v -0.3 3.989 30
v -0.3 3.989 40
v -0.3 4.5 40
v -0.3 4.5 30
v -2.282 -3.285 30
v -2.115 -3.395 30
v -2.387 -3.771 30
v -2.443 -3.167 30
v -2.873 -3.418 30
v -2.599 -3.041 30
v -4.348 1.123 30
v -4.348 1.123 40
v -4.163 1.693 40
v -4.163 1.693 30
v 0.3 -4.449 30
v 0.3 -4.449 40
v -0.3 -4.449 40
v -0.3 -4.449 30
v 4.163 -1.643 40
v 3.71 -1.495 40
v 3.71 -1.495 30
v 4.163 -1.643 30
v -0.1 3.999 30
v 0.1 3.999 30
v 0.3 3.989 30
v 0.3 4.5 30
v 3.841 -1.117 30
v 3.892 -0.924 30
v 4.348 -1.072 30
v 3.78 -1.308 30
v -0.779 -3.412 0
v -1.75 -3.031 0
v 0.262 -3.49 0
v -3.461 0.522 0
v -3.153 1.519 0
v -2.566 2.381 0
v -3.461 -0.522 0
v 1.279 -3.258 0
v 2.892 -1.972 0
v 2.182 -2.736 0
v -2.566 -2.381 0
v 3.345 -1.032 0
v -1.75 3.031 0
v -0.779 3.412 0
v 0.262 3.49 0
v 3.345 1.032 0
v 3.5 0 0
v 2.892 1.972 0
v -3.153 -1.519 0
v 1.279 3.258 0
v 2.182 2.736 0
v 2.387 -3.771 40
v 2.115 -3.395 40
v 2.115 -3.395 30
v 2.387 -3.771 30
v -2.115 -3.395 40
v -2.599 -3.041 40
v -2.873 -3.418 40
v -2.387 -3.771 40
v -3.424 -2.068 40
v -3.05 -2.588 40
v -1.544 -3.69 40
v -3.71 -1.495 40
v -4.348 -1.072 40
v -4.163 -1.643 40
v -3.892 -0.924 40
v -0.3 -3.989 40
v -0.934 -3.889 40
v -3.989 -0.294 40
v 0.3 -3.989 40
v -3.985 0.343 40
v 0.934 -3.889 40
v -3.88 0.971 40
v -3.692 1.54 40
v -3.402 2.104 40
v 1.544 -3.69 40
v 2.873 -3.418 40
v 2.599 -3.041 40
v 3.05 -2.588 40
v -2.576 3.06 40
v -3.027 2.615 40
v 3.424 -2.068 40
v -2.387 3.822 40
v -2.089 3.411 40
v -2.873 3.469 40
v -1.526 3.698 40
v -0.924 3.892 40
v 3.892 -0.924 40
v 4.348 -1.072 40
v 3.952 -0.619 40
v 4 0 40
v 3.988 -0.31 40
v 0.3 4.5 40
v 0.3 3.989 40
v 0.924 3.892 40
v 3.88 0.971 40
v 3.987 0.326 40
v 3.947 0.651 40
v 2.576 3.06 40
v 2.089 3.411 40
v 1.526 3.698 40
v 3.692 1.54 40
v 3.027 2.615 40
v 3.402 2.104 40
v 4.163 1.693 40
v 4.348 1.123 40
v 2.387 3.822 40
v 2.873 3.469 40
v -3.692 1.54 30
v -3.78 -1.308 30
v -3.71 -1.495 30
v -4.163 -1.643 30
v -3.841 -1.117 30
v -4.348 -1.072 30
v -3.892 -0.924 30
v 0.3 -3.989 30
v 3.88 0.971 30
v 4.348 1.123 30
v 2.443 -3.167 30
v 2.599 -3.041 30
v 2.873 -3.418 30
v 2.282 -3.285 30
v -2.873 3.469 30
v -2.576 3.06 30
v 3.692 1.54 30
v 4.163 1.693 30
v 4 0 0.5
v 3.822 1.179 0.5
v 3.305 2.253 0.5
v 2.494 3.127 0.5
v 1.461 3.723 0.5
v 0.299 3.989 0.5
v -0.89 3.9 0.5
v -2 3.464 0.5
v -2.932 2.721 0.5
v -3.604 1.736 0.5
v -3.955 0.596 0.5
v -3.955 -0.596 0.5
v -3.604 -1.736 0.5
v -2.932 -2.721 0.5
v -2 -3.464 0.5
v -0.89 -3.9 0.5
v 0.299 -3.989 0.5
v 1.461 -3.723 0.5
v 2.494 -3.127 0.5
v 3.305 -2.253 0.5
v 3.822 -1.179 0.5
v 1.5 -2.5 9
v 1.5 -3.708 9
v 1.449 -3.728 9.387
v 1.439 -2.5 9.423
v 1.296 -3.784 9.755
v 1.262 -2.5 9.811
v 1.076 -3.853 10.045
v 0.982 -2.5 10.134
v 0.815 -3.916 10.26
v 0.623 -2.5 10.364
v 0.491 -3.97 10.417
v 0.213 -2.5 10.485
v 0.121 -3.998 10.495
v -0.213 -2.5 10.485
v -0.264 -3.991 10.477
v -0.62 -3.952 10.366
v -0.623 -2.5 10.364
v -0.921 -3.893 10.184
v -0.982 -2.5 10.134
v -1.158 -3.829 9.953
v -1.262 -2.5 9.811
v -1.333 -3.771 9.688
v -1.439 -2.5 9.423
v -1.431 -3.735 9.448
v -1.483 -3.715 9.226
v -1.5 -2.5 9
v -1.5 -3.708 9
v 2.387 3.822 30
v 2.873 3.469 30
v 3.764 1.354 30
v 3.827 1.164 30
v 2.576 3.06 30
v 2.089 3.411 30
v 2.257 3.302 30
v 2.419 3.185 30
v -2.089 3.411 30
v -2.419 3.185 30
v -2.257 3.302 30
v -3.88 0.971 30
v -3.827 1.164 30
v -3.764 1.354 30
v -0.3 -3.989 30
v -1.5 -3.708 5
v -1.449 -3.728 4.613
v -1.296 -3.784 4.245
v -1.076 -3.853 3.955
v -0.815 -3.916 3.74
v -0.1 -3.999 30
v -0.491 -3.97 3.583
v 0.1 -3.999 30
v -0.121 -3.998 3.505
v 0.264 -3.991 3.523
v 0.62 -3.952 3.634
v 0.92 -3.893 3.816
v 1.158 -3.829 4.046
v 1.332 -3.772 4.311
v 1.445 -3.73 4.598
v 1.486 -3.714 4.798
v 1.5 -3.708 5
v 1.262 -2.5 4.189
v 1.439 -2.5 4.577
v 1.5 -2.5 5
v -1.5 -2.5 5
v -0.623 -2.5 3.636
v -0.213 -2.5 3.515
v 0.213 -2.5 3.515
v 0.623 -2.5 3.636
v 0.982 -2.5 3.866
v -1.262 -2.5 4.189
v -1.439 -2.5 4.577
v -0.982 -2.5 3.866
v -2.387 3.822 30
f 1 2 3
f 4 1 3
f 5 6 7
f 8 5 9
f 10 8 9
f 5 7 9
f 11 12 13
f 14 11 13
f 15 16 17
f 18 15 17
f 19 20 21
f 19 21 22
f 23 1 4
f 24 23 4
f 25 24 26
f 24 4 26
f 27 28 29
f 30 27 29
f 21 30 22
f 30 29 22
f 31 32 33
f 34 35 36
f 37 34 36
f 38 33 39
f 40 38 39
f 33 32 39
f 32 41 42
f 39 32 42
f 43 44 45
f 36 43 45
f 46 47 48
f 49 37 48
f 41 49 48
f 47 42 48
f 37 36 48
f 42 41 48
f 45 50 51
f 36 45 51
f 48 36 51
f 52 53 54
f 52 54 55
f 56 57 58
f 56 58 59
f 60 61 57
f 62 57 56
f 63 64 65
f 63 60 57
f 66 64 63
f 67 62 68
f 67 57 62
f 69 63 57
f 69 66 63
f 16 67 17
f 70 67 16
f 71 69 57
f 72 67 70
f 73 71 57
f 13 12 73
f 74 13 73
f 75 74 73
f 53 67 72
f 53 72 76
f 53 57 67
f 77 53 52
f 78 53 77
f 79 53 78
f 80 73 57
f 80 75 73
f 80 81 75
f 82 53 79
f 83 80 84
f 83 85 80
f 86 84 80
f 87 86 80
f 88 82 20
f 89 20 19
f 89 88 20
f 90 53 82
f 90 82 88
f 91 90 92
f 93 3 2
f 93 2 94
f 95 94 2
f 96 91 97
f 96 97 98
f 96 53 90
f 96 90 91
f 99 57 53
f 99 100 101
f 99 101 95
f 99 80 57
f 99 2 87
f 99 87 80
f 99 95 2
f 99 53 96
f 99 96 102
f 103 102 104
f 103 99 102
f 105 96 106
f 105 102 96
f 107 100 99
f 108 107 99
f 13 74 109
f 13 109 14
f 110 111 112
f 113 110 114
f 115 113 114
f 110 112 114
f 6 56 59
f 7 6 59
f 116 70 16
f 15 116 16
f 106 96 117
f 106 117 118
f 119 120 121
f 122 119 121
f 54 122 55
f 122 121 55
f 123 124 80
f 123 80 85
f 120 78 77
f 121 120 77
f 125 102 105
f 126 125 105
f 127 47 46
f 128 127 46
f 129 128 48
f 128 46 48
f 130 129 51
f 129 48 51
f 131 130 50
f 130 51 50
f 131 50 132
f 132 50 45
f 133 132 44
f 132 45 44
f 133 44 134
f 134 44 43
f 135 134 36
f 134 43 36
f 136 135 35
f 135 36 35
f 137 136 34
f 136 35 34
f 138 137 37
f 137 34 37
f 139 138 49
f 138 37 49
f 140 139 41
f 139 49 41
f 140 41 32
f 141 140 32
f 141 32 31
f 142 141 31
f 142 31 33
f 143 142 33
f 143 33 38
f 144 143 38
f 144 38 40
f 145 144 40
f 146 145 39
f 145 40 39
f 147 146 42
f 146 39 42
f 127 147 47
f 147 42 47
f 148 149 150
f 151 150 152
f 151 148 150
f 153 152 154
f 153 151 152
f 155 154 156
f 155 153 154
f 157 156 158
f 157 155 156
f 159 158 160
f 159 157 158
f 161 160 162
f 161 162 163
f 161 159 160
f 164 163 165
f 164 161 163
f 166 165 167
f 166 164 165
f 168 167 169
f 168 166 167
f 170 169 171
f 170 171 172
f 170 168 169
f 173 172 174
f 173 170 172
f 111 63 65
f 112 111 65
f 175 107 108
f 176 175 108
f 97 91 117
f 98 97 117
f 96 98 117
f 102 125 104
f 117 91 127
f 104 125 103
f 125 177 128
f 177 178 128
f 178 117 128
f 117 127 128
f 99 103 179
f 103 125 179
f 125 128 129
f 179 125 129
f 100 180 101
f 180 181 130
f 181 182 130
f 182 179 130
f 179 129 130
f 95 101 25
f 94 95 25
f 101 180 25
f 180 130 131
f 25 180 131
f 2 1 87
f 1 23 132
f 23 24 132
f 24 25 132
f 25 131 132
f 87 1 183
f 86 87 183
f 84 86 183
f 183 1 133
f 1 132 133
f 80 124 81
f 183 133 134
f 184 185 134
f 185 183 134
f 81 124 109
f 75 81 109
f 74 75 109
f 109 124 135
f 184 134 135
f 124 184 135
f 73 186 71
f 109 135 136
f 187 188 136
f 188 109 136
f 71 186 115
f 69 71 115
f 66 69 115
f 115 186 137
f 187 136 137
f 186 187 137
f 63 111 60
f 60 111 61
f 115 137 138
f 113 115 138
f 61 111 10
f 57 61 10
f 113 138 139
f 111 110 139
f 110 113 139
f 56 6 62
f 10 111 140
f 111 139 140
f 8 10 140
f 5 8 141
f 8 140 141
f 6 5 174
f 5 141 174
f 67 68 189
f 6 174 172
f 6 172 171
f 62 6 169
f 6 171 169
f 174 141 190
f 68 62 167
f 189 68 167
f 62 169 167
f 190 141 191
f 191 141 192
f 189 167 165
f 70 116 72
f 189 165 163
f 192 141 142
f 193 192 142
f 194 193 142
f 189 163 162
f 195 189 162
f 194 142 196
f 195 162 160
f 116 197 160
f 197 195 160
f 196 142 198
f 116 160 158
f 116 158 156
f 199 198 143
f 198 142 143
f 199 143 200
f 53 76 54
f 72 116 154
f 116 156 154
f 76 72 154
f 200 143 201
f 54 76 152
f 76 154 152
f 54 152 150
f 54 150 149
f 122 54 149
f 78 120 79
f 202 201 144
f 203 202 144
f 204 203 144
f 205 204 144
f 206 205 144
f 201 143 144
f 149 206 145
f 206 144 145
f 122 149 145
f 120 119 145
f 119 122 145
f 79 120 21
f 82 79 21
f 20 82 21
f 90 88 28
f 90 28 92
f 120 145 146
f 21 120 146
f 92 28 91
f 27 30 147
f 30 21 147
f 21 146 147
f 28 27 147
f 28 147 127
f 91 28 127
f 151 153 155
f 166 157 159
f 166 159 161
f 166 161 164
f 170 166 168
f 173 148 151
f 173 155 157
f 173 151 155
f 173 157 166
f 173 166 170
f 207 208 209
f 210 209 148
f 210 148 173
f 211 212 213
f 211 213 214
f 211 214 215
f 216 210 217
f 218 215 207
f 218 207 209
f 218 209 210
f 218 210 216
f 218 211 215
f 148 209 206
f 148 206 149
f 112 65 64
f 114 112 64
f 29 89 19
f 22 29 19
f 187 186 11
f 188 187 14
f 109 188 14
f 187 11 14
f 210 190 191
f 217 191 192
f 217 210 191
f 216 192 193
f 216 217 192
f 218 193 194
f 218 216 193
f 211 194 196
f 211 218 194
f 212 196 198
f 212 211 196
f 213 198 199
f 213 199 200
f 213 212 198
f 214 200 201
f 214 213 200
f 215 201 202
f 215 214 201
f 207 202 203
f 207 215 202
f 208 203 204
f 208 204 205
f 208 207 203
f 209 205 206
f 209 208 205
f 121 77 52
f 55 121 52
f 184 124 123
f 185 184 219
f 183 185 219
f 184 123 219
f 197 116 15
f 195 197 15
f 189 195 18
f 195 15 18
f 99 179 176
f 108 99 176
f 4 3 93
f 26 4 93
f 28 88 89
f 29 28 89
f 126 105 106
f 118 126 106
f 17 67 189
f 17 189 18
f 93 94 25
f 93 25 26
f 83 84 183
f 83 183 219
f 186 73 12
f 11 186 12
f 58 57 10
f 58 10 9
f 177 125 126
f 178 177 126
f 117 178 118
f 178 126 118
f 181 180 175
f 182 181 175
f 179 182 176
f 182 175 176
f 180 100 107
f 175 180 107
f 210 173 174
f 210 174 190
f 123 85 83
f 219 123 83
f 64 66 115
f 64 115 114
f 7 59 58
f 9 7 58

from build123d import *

# Parameters (mm, degrees)
SKETCH1_R           = 4
BOSS_EXTRUDE1_DEPTH = 40
CUT_EXTRUDE2_START  = -2.5
CUT_EXTRUDE2_DEPTH  = 38.898019753
SKETCH9_W           = 0.6
SKETCH9_H           = 2.871442339
BOSS_EXTRUDE2_DEPTH = 10
CIRPATTERN1_COUNT   = 10
CHAMFER1_SIZE       = 0.5


with BuildPart() as part:
    # Sketch1 → Boss-Extrude1 (new body)
    with BuildSketch(Plane.XY):
        Circle(SKETCH1_R)
    extrude(amount=BOSS_EXTRUDE1_DEPTH)

    # Sketch8 → Cut-Extrude2 (cut, through all)
    with BuildSketch(Plane(origin=(0, 0, 0), x_dir=(1, 0, 0), z_dir=(0, 1, 0)).offset(CUT_EXTRUDE2_START)):
        with BuildLine():
            Line((1.5, -5), (1.5, -9))
            ThreePointArc((1.5, -9), (0, -10.5), (-1.5, -9))
            Line((-1.5, -9), (-1.5, -5))
            ThreePointArc((-1.5, -5), (0, -3.5), (1.5, -5))
        make_face()
    extrude(amount=-CUT_EXTRUDE2_DEPTH, mode=Mode.SUBTRACT)

    # Sketch9 → Boss-Extrude2 (add)
    with BuildSketch(Plane.XY.offset(40)):
        with Locations((0, 3.064278831)):
            Rectangle(SKETCH9_W, SKETCH9_H)
    boss_extrude2 = extrude(amount=-BOSS_EXTRUDE2_DEPTH)

    # CirPattern1: Boss-Extrude2 ×10 about axis
    cirpattern1_axis = Axis((0, 0.025391685, 0), (0, 0, 1))
    for i in range(1, CIRPATTERN1_COUNT):
        add(boss_extrude2.rotate(cirpattern1_axis, i * 360 / CIRPATTERN1_COUNT))

    # Chamfer1
    chamfer1_edges = [part.edges().sort_by_distance(p)[0] for p in [
        (-4, 0, 0),
    ]]
    chamfer(chamfer1_edges, length=CHAMFER1_SIZE)


solid = part.part
